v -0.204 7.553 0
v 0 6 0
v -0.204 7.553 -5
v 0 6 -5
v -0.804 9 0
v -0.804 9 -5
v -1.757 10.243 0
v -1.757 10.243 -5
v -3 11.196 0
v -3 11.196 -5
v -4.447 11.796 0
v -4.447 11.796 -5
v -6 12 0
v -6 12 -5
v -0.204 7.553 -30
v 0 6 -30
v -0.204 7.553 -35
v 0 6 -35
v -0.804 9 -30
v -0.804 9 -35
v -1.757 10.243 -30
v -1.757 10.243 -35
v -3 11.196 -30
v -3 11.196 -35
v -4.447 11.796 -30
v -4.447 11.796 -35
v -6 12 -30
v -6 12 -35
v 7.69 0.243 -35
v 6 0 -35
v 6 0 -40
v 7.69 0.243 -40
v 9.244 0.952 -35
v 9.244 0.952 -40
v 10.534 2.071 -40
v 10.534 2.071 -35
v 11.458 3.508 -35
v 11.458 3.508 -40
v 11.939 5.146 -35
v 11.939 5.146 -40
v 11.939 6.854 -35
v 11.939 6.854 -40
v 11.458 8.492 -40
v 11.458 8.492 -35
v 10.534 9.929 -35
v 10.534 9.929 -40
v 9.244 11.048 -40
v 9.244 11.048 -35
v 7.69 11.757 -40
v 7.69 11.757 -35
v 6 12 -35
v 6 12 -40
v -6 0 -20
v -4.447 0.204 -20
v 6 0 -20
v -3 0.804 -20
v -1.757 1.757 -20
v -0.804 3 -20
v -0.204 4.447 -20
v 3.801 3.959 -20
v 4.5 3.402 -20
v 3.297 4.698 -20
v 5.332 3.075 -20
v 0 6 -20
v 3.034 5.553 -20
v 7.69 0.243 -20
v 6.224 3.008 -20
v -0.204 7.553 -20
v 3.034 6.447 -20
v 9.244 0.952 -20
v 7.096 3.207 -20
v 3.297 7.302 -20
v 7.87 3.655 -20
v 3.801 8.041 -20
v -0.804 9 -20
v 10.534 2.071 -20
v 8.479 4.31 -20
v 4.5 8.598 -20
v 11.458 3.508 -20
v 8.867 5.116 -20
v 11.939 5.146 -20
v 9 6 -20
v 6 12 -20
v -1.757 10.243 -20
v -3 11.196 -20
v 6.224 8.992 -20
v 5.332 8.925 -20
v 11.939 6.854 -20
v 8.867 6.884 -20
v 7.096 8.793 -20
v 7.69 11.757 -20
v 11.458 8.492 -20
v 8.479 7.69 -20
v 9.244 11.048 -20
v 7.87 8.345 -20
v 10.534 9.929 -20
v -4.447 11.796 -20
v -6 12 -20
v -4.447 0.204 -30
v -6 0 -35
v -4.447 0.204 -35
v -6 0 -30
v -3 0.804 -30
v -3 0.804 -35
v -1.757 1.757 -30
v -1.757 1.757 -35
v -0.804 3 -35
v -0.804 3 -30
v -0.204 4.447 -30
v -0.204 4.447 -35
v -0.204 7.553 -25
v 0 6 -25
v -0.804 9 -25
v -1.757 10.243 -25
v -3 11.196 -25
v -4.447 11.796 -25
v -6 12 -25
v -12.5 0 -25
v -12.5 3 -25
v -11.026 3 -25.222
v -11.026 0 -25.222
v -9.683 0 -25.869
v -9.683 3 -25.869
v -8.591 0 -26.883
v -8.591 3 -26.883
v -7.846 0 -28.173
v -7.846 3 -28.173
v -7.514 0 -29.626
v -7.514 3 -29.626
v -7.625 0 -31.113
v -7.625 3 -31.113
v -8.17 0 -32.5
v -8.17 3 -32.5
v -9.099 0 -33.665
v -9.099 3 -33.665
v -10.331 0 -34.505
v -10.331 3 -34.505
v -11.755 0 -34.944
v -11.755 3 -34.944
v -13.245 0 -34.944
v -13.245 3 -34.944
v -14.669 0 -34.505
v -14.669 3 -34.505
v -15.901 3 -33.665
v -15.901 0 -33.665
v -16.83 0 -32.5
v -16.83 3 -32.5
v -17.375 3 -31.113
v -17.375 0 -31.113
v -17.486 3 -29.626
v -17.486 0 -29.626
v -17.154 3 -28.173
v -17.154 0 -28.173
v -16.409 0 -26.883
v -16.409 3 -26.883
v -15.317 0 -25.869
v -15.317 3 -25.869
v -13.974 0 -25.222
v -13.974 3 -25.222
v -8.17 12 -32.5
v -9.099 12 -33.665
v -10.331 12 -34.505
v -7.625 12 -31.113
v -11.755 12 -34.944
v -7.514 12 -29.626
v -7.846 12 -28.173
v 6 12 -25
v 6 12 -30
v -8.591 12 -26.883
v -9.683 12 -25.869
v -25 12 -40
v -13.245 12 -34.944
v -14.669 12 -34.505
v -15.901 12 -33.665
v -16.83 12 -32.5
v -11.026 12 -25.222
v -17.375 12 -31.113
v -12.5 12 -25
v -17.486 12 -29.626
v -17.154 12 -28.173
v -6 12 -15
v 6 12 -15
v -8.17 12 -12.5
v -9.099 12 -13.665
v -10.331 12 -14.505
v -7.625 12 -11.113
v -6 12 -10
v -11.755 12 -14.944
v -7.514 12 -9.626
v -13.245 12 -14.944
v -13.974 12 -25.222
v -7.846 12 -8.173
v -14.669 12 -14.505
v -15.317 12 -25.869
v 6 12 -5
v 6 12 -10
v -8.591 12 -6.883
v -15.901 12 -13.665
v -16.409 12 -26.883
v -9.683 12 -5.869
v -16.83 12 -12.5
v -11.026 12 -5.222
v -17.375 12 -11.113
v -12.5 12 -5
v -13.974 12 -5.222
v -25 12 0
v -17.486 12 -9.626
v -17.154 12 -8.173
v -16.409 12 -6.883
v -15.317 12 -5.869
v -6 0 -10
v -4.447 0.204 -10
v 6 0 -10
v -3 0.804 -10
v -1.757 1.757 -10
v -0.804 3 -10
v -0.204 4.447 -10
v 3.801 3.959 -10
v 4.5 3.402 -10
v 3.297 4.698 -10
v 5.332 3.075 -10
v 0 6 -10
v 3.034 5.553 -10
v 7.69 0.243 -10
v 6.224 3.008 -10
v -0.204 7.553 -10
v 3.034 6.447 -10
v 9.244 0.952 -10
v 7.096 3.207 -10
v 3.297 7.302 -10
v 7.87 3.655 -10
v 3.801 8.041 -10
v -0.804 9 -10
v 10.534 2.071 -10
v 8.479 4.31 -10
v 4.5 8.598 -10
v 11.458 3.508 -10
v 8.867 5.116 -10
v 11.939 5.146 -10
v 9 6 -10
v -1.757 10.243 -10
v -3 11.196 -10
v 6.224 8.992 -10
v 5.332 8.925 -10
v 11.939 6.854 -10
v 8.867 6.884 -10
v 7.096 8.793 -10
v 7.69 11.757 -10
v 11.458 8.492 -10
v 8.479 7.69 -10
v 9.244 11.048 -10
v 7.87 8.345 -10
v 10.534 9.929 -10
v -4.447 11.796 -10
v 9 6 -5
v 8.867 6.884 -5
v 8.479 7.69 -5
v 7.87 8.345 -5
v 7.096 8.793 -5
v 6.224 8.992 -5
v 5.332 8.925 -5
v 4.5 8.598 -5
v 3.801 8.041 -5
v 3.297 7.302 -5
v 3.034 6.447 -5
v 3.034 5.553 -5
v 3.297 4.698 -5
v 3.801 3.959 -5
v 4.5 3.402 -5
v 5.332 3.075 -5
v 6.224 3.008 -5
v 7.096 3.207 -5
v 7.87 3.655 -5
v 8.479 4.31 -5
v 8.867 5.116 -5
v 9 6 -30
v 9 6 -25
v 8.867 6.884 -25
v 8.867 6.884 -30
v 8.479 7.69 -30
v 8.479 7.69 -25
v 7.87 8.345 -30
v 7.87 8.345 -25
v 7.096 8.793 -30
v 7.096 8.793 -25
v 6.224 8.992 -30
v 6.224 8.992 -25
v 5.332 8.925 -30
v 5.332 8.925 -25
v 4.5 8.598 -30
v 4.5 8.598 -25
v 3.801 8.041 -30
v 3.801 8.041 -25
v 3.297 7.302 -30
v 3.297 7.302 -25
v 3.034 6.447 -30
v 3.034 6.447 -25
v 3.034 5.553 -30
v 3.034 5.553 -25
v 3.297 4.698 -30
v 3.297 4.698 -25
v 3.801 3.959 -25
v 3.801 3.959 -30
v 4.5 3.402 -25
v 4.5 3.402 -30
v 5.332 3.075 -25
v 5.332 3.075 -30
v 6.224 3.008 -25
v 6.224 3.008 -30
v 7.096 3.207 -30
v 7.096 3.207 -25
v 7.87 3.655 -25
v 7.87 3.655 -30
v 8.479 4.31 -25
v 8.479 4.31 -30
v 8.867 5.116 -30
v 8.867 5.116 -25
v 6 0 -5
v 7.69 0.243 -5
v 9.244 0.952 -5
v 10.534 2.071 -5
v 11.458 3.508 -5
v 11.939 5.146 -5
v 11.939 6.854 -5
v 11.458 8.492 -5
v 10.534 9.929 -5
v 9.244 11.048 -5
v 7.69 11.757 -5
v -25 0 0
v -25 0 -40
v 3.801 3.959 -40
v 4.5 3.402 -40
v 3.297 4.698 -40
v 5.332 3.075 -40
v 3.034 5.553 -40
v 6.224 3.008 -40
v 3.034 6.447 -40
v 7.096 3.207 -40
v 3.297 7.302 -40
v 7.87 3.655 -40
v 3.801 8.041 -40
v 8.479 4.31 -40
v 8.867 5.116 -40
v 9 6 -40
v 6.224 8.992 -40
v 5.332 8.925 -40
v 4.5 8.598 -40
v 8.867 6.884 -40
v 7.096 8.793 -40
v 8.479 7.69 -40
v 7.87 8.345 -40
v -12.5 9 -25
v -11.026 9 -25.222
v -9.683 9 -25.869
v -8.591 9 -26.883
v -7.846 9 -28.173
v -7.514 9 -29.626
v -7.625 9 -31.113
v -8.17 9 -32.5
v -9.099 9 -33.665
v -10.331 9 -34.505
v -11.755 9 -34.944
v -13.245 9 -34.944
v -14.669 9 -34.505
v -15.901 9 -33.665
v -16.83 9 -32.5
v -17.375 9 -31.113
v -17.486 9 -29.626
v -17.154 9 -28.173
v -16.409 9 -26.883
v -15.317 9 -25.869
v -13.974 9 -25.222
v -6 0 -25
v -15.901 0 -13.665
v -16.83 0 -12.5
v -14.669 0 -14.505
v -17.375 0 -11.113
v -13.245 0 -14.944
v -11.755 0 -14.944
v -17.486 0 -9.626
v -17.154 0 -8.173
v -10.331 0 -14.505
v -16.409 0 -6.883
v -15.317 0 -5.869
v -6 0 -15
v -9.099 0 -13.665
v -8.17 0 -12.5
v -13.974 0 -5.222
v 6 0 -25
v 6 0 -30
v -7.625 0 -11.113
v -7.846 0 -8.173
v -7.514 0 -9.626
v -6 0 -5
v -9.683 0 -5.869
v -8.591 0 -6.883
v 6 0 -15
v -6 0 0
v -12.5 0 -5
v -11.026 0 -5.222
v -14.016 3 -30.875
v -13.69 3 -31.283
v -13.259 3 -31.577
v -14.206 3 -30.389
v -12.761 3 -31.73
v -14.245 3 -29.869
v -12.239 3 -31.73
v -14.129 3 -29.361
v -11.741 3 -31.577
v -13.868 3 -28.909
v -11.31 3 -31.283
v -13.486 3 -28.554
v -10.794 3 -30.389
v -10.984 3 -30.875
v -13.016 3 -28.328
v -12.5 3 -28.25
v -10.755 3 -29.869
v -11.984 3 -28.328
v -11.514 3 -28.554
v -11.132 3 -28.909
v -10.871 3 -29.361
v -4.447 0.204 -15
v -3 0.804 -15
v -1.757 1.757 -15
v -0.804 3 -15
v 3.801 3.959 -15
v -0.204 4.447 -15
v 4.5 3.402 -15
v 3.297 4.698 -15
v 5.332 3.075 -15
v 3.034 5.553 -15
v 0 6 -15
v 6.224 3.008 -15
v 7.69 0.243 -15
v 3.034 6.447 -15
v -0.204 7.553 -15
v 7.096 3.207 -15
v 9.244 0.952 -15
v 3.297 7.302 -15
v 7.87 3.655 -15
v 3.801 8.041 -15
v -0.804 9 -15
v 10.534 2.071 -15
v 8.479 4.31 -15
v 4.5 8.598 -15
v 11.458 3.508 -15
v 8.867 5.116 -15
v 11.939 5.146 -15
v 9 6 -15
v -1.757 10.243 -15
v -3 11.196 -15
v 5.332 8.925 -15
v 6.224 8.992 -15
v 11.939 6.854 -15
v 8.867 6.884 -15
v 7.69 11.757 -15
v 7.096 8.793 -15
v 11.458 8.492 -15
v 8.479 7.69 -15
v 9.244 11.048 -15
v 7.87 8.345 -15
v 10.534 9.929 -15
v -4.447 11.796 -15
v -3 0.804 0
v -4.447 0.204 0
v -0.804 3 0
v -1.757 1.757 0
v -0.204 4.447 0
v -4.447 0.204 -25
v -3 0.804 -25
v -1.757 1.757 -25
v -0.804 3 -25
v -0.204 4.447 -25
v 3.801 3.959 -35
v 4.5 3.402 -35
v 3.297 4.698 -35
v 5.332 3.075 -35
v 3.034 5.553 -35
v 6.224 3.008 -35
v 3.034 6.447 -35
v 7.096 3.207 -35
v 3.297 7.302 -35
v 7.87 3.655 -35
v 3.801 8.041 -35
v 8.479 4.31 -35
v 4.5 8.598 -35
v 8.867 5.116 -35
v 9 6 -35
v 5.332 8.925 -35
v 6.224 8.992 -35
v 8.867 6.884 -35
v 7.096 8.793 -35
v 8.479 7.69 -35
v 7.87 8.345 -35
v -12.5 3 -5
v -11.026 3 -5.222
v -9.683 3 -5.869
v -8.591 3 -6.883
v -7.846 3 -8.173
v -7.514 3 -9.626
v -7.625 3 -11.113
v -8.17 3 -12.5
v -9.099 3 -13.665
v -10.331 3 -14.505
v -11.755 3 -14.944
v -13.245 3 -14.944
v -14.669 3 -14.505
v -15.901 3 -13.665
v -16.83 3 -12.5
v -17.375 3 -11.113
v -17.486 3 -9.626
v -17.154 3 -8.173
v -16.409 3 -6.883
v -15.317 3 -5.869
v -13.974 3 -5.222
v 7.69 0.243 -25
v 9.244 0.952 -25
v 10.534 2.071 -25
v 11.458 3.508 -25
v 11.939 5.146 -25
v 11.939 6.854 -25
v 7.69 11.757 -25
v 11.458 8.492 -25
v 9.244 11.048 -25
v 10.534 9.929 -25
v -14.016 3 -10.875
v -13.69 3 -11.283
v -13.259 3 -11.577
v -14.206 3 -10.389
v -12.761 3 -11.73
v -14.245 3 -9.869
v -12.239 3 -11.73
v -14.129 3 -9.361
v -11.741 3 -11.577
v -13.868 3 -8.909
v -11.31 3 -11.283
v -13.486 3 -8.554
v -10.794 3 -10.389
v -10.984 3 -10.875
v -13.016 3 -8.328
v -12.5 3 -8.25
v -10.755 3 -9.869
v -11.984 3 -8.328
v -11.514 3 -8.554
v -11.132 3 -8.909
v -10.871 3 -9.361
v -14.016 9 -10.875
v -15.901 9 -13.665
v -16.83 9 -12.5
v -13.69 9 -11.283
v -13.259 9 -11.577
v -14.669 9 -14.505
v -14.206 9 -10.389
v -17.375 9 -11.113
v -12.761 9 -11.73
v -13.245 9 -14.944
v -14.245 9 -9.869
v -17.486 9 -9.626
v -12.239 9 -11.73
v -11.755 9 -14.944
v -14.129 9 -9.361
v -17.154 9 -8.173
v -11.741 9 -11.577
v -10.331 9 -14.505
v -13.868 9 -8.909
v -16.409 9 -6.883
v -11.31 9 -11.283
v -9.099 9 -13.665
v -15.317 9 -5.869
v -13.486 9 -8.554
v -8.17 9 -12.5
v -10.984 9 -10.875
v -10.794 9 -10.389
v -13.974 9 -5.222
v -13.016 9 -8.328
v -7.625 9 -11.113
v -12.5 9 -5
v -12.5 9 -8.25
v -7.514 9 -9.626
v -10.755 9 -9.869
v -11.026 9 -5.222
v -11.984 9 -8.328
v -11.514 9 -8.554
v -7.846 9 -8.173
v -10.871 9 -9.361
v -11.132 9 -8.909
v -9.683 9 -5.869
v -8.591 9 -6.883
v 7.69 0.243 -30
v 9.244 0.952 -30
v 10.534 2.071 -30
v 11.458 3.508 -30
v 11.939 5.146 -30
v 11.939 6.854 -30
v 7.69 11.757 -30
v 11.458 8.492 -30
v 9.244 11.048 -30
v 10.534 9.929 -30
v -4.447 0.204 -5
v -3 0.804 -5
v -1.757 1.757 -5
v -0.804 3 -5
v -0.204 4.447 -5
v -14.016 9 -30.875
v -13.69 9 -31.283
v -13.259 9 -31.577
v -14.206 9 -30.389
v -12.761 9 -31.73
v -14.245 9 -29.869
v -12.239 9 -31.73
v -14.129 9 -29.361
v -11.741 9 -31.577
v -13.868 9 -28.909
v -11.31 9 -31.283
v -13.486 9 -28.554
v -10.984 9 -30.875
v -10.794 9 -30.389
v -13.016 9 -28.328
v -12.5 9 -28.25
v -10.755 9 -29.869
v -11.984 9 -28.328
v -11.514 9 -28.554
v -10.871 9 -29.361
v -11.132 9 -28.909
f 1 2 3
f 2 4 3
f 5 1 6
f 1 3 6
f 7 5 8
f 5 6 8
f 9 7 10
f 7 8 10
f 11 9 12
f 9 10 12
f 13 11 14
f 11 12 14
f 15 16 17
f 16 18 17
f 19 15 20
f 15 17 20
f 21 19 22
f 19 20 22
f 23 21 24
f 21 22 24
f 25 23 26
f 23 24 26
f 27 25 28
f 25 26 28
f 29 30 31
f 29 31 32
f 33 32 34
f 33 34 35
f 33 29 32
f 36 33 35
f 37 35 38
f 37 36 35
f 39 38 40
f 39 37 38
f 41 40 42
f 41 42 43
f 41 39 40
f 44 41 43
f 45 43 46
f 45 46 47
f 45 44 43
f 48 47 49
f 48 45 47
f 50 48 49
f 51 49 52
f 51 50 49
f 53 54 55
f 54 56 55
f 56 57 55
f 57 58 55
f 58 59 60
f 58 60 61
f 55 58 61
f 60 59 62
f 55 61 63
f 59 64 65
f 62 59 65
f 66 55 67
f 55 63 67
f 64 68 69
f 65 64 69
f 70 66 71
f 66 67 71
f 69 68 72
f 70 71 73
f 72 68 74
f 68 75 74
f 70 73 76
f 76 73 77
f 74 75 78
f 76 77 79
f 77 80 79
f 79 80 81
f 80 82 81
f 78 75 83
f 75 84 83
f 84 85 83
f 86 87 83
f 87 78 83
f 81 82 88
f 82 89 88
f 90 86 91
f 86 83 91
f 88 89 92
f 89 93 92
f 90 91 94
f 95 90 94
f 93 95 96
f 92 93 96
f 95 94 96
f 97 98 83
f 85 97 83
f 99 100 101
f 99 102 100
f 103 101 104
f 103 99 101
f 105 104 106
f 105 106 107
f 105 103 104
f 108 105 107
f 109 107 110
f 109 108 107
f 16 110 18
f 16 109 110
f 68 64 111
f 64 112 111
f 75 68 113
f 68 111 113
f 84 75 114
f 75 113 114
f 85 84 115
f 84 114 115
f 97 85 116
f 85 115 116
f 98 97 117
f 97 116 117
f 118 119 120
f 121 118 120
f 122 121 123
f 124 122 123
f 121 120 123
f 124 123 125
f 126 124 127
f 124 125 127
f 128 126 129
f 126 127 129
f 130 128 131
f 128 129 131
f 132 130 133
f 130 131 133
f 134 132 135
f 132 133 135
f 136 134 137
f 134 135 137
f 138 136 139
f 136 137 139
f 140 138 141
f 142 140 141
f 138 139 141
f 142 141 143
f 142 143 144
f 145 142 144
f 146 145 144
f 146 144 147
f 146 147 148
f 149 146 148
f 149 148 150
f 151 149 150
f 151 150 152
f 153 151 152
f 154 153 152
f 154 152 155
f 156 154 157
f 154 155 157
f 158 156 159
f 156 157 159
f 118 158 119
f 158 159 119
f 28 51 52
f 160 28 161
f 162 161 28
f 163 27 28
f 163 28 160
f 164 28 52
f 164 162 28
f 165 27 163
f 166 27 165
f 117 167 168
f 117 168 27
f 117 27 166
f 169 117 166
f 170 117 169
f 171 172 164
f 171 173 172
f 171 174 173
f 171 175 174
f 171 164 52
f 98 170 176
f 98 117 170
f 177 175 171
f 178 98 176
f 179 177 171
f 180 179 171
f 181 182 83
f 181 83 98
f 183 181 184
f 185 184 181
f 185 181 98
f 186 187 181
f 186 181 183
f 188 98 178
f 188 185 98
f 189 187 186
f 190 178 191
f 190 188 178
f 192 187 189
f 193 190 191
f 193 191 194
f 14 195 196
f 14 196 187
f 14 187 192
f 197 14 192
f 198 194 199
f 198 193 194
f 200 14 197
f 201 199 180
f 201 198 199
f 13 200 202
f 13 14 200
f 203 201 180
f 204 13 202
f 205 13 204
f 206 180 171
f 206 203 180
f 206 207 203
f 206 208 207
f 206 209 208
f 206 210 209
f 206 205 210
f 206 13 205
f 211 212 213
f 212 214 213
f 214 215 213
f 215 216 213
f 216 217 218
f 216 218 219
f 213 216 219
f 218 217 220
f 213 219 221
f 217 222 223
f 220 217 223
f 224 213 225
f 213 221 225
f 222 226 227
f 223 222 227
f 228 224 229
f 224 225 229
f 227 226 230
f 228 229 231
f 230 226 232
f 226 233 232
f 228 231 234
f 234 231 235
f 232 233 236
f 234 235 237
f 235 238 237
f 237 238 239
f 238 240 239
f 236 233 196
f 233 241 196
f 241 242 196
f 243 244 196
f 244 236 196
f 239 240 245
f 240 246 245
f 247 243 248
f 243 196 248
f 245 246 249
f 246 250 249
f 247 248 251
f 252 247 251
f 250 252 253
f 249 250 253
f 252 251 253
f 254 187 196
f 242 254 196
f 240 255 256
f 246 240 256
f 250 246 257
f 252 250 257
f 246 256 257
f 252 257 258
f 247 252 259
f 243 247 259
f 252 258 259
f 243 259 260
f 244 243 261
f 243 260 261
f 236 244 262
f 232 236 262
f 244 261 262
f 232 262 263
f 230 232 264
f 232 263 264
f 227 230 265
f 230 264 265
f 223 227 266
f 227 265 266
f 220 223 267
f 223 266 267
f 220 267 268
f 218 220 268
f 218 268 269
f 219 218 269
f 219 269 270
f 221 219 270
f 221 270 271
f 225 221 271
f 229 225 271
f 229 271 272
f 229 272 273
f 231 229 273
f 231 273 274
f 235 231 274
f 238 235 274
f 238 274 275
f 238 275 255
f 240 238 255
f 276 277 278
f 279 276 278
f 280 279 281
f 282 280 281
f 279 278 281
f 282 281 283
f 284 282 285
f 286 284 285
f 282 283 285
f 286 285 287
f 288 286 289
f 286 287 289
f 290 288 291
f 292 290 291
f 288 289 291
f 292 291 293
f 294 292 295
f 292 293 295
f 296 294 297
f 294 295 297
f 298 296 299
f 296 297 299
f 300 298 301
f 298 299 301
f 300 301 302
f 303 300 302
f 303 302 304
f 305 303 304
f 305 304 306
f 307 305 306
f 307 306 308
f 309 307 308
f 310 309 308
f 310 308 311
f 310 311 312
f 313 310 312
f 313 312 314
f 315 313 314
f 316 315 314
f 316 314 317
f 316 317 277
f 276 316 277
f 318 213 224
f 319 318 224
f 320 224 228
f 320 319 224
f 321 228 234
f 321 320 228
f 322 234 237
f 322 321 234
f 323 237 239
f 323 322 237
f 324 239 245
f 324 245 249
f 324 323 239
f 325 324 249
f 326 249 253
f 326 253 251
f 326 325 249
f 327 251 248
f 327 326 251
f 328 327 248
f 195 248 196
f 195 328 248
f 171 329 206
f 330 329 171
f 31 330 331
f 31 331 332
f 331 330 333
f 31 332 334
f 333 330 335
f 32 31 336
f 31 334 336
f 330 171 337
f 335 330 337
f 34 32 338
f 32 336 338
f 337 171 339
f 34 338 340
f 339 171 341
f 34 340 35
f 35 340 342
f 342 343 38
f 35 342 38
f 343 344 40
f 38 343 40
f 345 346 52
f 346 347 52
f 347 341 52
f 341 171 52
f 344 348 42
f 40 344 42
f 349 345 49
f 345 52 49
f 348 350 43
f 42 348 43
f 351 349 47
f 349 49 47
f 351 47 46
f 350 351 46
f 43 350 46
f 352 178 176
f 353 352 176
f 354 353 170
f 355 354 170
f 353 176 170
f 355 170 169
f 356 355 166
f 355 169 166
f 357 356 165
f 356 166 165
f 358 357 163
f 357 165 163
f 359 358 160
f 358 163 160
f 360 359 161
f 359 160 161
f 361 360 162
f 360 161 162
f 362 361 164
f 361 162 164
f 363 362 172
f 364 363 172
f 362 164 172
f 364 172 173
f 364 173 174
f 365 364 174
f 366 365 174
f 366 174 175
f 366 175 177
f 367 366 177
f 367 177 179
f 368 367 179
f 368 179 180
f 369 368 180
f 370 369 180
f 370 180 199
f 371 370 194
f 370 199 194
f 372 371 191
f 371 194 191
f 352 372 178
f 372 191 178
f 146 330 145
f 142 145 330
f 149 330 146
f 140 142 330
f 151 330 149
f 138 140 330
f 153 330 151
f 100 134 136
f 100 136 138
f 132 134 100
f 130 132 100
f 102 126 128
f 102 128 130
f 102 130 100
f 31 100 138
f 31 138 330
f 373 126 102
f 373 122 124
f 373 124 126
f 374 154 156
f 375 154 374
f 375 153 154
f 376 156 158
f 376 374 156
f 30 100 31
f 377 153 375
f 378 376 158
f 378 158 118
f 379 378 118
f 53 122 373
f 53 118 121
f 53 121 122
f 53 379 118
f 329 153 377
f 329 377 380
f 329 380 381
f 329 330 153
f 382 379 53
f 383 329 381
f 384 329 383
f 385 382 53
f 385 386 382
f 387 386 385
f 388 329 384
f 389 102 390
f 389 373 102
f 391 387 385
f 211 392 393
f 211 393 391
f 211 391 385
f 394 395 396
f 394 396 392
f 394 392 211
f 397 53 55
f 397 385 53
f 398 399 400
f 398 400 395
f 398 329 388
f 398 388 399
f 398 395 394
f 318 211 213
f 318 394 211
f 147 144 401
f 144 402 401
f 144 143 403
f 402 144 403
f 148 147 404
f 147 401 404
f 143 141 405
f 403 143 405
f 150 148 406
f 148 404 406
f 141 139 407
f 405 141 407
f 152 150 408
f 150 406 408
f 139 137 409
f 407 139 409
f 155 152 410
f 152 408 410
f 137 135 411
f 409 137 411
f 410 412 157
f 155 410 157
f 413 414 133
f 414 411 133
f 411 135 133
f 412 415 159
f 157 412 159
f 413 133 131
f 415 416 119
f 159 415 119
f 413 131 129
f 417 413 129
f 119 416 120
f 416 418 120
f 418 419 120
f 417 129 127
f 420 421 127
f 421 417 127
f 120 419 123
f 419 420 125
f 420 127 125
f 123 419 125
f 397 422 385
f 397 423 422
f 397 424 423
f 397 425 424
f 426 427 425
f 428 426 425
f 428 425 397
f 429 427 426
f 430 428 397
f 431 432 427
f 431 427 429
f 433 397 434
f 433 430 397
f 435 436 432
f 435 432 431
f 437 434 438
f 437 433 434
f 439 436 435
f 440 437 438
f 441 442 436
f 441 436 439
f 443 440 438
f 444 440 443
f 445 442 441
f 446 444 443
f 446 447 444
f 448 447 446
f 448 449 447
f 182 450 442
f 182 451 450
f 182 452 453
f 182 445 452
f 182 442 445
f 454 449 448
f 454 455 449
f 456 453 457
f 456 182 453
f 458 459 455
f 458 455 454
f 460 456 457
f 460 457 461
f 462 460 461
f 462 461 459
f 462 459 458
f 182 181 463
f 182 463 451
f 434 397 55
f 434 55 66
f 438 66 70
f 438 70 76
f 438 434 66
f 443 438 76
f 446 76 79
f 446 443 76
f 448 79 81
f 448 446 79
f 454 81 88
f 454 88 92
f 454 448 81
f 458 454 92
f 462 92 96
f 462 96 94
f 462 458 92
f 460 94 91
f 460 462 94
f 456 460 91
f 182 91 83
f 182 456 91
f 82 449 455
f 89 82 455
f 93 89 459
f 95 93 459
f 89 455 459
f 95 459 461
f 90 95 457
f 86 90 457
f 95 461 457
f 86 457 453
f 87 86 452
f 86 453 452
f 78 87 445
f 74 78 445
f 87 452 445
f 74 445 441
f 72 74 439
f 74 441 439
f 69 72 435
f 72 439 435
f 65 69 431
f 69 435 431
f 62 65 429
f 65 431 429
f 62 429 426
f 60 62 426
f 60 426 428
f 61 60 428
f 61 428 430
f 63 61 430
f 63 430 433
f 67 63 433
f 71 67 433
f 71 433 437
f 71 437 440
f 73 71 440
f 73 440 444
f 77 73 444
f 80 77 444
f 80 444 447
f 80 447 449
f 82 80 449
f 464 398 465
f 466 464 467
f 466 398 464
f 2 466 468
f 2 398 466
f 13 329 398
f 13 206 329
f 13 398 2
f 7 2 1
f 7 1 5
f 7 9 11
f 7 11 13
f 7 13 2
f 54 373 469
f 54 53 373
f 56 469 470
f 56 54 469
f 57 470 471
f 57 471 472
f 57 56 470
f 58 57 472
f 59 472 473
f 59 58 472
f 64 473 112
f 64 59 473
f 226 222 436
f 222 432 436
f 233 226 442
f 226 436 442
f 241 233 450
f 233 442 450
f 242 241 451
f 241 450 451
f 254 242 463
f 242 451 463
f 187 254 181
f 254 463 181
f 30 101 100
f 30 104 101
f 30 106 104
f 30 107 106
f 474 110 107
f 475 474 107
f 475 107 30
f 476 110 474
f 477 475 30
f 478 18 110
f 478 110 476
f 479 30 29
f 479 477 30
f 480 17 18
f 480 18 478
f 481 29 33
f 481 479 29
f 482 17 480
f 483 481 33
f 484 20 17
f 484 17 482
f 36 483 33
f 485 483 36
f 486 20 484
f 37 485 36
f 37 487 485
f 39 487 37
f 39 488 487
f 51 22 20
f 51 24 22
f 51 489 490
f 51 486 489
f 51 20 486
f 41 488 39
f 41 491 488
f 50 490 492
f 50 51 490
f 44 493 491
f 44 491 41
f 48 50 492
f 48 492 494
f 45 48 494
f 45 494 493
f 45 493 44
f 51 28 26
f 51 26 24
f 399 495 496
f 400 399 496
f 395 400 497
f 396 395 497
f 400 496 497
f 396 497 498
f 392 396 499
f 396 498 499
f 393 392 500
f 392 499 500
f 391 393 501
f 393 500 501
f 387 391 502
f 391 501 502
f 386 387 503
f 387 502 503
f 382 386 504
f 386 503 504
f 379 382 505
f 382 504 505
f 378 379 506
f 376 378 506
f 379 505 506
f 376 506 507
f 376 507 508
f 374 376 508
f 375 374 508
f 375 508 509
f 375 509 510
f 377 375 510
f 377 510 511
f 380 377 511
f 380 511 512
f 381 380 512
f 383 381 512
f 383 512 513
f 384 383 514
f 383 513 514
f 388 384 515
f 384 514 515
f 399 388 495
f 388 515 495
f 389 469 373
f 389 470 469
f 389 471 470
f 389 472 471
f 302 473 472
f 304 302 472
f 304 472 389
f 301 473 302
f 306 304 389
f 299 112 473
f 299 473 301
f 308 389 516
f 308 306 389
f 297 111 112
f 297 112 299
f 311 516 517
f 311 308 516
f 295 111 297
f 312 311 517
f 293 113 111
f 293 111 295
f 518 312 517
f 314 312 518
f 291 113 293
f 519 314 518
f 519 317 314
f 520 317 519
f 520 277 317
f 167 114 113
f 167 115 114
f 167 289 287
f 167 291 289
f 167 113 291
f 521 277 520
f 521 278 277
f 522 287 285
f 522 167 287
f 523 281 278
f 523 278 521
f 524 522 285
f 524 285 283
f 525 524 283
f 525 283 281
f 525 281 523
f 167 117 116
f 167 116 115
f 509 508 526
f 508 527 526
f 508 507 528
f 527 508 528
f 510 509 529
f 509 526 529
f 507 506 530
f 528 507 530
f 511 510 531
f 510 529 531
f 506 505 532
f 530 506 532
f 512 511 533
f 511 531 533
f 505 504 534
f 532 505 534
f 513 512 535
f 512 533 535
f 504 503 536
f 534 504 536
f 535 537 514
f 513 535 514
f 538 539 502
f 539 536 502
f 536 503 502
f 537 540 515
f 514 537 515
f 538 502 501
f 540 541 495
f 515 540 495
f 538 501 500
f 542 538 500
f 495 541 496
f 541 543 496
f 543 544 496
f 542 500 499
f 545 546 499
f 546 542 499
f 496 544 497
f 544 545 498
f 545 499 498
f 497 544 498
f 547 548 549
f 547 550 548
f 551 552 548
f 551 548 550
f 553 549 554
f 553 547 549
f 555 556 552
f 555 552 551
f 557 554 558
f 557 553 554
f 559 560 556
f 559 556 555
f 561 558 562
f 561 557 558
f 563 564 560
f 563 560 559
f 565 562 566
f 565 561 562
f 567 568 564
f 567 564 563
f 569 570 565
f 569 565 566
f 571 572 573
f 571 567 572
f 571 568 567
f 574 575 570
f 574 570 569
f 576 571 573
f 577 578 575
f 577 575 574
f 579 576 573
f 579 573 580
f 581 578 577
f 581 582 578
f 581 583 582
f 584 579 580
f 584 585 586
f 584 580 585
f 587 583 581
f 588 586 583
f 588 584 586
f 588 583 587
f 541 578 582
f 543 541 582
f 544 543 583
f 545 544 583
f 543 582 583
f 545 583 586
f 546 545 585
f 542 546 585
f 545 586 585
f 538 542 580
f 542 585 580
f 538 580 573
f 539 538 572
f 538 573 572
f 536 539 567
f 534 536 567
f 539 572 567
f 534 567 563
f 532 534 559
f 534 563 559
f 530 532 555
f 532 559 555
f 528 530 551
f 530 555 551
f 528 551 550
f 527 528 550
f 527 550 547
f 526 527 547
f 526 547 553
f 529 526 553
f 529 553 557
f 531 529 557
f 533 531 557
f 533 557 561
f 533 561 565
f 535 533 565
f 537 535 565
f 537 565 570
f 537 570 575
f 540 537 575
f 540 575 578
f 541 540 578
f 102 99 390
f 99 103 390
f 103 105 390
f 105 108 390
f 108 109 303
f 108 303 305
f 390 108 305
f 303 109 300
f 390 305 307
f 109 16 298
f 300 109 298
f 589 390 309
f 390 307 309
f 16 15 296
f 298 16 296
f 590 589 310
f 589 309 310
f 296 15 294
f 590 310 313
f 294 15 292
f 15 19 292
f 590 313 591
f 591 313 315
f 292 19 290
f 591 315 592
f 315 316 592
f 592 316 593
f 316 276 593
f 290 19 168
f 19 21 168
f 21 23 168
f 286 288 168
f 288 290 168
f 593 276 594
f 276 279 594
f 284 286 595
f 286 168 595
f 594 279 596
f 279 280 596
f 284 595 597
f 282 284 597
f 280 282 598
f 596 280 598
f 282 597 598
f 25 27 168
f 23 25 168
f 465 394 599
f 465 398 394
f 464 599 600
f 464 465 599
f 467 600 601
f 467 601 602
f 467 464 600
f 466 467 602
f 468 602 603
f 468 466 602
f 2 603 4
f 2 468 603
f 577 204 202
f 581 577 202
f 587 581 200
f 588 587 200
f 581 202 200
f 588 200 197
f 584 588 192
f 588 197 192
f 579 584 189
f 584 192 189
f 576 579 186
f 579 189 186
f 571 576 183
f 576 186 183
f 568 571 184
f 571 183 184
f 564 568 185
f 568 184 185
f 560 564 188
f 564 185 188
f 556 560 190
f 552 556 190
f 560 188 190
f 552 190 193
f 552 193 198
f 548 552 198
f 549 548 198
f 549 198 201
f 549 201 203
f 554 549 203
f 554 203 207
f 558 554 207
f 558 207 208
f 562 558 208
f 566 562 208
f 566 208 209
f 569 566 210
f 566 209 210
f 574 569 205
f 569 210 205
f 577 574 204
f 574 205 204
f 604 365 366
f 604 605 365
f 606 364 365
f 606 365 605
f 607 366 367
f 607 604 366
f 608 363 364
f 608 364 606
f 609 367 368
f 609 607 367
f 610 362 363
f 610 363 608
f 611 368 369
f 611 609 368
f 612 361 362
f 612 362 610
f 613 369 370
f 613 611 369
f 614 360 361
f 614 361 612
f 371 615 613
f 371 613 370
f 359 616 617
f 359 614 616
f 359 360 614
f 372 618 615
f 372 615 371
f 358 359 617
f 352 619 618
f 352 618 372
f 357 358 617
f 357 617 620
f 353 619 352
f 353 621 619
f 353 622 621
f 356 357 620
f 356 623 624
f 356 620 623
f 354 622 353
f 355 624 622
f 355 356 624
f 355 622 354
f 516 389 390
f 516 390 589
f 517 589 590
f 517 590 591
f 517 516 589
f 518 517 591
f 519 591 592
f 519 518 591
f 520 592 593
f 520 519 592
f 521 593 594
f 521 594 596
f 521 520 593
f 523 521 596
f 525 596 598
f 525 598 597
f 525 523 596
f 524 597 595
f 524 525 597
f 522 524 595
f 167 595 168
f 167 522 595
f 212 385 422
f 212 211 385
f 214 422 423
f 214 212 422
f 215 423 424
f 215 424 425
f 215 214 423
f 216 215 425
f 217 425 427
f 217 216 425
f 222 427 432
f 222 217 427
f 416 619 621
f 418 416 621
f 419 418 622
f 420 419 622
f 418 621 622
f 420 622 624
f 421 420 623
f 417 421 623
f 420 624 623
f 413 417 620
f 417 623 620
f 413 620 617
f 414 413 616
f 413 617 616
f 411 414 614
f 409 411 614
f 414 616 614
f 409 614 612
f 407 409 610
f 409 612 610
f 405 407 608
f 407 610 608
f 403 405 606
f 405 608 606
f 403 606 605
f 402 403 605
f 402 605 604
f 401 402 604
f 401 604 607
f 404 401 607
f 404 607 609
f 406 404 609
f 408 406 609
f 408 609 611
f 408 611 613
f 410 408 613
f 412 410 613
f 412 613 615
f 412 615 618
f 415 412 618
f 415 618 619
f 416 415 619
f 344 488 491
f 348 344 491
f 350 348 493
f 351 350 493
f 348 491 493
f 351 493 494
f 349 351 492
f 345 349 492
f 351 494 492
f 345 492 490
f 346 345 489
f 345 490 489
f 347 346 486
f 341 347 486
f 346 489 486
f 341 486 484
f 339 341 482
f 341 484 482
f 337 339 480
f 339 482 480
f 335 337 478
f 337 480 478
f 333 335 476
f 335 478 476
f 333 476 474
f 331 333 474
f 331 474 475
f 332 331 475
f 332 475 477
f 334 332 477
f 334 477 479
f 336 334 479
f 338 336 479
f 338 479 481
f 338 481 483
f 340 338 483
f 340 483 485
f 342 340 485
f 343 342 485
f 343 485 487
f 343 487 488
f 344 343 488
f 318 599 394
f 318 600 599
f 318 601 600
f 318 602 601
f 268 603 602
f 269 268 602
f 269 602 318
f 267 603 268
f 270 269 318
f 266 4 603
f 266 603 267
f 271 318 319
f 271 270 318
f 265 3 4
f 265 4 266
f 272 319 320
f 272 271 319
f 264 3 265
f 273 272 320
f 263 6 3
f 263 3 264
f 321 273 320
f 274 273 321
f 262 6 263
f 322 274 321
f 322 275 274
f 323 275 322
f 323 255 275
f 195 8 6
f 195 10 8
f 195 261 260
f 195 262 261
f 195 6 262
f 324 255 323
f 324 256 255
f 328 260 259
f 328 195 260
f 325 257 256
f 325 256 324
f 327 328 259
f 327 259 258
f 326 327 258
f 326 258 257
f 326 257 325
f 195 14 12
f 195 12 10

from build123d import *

# Parameters (mm, degrees)
SKETCH1_W           = 25
SKETCH1_H           = 40
BOSS_EXTRUDE1_DEPTH = 12
SKETCH2_R           = 3
BOSS_EXTRUDE2_DEPTH = 40
SKETCH3_W           = 12
SKETCH3_H           = 5
CUT_EXTRUDE1_DEPTH  = 49.672374095
LPATTERN1_COUNT     = 4
LPATTERN1_PITCH     = 10
SKETCH4_R           = 1.75
CUT_EXTRUDE2_DEPTH  = 49.672374095
SKETCH5_R           = 5
CUT_EXTRUDE3_DEPTH  = 3
LPATTERN2_COUNT     = 2
LPATTERN2_PITCH     = 9
FILLET1_R           = 6


with BuildPart() as part:
    # Sketch1 → Boss-Extrude1 (new body)
    with BuildSketch(Plane(origin=(0, 0, 0), x_dir=(1, 0, 0), z_dir=(0, 1, 0))):
        with Locations((-12.5, 20)):
            Rectangle(SKETCH1_W, SKETCH1_H)
    extrude(amount=BOSS_EXTRUDE1_DEPTH)

    # Sketch2 → Boss-Extrude2 (add)
    with BuildSketch(Plane.XY):
        with BuildLine():
            Line((0, 6), (0, 0))
            Line((0, 0), (6, 0))
            ThreePointArc((6, 0), (12, 6), (6, 12))
            Line((6, 12), (0, 12))
            Line((0, 12), (0, 6))
        make_face()
        with Locations((6, 6)):
            Circle(SKETCH2_R, mode=Mode.SUBTRACT)
    extrude(amount=-BOSS_EXTRUDE2_DEPTH)

    # Sketch3 → Cut-Extrude1 (cut, through all)
    with BuildSketch(Plane(origin=(0, 12, 0), x_dir=(1, 0, 0), z_dir=(0, 1, 0))):
        with Locations((6, 32.5)):
            Rectangle(SKETCH3_W, SKETCH3_H)
    cut_extrude1 = extrude(amount=-CUT_EXTRUDE1_DEPTH, mode=Mode.SUBTRACT)

    # LPattern1: Cut-Extrude1 ×4
    with Locations(*[(0, 0, i * LPATTERN1_PITCH) for i in range(1, LPATTERN1_COUNT)]):
        add(cut_extrude1, mode=Mode.SUBTRACT)

    # Sketch4 → Cut-Extrude2 (cut, through all)
    with BuildSketch(Plane(origin=(0, 12, 0), x_dir=(1, 0, 0), z_dir=(0, 1, 0))):
        with Locations(Location((-12.5, 30, 0), (0, 0, 270))):
            Circle(SKETCH4_R)
        with Locations(Location((-12.5, 10, 0), (0, 0, 270))):
            Circle(SKETCH4_R)
    extrude(amount=-CUT_EXTRUDE2_DEPTH, mode=Mode.SUBTRACT)

    # Sketch5 → Cut-Extrude3 (cut)
    with BuildSketch(Plane(origin=(0, 12, 0), x_dir=(1, 0, 0), z_dir=(0, 1, 0))):
        with Locations(Location((-12.5, 30, 0), (0, 0, 270))):
            Circle(SKETCH5_R)
        with Locations(Location((-12.5, 10, 0), (0, 0, 270))):
            Circle(SKETCH5_R)
    cut_extrude3 = extrude(amount=-CUT_EXTRUDE3_DEPTH, mode=Mode.SUBTRACT)

    # LPattern2: Cut-Extrude3 ×2
    with Locations(*[(0, -i * LPATTERN2_PITCH, 0) for i in range(1, LPATTERN2_COUNT)]):
        add(cut_extrude3, mode=Mode.SUBTRACT)

    # Fillet1
    fillet1_edges = [part.edges().sort_by_distance(p)[0] for p in [
        (0, 0, -2.5),
        (0, 12, -2.5),
        (0, 0, -12.5),
        (0, 12, -12.5),
        (0, 0, -22.5),
        (0, 12, -22.5),
        (0, 0, -32.5),
        (0, 12, -32.5),
    ]]
    fillet(fillet1_edges, radius=FILLET1_R - 0.0001)  # a hair under: the kernel refuses the full size


solid = part.part
